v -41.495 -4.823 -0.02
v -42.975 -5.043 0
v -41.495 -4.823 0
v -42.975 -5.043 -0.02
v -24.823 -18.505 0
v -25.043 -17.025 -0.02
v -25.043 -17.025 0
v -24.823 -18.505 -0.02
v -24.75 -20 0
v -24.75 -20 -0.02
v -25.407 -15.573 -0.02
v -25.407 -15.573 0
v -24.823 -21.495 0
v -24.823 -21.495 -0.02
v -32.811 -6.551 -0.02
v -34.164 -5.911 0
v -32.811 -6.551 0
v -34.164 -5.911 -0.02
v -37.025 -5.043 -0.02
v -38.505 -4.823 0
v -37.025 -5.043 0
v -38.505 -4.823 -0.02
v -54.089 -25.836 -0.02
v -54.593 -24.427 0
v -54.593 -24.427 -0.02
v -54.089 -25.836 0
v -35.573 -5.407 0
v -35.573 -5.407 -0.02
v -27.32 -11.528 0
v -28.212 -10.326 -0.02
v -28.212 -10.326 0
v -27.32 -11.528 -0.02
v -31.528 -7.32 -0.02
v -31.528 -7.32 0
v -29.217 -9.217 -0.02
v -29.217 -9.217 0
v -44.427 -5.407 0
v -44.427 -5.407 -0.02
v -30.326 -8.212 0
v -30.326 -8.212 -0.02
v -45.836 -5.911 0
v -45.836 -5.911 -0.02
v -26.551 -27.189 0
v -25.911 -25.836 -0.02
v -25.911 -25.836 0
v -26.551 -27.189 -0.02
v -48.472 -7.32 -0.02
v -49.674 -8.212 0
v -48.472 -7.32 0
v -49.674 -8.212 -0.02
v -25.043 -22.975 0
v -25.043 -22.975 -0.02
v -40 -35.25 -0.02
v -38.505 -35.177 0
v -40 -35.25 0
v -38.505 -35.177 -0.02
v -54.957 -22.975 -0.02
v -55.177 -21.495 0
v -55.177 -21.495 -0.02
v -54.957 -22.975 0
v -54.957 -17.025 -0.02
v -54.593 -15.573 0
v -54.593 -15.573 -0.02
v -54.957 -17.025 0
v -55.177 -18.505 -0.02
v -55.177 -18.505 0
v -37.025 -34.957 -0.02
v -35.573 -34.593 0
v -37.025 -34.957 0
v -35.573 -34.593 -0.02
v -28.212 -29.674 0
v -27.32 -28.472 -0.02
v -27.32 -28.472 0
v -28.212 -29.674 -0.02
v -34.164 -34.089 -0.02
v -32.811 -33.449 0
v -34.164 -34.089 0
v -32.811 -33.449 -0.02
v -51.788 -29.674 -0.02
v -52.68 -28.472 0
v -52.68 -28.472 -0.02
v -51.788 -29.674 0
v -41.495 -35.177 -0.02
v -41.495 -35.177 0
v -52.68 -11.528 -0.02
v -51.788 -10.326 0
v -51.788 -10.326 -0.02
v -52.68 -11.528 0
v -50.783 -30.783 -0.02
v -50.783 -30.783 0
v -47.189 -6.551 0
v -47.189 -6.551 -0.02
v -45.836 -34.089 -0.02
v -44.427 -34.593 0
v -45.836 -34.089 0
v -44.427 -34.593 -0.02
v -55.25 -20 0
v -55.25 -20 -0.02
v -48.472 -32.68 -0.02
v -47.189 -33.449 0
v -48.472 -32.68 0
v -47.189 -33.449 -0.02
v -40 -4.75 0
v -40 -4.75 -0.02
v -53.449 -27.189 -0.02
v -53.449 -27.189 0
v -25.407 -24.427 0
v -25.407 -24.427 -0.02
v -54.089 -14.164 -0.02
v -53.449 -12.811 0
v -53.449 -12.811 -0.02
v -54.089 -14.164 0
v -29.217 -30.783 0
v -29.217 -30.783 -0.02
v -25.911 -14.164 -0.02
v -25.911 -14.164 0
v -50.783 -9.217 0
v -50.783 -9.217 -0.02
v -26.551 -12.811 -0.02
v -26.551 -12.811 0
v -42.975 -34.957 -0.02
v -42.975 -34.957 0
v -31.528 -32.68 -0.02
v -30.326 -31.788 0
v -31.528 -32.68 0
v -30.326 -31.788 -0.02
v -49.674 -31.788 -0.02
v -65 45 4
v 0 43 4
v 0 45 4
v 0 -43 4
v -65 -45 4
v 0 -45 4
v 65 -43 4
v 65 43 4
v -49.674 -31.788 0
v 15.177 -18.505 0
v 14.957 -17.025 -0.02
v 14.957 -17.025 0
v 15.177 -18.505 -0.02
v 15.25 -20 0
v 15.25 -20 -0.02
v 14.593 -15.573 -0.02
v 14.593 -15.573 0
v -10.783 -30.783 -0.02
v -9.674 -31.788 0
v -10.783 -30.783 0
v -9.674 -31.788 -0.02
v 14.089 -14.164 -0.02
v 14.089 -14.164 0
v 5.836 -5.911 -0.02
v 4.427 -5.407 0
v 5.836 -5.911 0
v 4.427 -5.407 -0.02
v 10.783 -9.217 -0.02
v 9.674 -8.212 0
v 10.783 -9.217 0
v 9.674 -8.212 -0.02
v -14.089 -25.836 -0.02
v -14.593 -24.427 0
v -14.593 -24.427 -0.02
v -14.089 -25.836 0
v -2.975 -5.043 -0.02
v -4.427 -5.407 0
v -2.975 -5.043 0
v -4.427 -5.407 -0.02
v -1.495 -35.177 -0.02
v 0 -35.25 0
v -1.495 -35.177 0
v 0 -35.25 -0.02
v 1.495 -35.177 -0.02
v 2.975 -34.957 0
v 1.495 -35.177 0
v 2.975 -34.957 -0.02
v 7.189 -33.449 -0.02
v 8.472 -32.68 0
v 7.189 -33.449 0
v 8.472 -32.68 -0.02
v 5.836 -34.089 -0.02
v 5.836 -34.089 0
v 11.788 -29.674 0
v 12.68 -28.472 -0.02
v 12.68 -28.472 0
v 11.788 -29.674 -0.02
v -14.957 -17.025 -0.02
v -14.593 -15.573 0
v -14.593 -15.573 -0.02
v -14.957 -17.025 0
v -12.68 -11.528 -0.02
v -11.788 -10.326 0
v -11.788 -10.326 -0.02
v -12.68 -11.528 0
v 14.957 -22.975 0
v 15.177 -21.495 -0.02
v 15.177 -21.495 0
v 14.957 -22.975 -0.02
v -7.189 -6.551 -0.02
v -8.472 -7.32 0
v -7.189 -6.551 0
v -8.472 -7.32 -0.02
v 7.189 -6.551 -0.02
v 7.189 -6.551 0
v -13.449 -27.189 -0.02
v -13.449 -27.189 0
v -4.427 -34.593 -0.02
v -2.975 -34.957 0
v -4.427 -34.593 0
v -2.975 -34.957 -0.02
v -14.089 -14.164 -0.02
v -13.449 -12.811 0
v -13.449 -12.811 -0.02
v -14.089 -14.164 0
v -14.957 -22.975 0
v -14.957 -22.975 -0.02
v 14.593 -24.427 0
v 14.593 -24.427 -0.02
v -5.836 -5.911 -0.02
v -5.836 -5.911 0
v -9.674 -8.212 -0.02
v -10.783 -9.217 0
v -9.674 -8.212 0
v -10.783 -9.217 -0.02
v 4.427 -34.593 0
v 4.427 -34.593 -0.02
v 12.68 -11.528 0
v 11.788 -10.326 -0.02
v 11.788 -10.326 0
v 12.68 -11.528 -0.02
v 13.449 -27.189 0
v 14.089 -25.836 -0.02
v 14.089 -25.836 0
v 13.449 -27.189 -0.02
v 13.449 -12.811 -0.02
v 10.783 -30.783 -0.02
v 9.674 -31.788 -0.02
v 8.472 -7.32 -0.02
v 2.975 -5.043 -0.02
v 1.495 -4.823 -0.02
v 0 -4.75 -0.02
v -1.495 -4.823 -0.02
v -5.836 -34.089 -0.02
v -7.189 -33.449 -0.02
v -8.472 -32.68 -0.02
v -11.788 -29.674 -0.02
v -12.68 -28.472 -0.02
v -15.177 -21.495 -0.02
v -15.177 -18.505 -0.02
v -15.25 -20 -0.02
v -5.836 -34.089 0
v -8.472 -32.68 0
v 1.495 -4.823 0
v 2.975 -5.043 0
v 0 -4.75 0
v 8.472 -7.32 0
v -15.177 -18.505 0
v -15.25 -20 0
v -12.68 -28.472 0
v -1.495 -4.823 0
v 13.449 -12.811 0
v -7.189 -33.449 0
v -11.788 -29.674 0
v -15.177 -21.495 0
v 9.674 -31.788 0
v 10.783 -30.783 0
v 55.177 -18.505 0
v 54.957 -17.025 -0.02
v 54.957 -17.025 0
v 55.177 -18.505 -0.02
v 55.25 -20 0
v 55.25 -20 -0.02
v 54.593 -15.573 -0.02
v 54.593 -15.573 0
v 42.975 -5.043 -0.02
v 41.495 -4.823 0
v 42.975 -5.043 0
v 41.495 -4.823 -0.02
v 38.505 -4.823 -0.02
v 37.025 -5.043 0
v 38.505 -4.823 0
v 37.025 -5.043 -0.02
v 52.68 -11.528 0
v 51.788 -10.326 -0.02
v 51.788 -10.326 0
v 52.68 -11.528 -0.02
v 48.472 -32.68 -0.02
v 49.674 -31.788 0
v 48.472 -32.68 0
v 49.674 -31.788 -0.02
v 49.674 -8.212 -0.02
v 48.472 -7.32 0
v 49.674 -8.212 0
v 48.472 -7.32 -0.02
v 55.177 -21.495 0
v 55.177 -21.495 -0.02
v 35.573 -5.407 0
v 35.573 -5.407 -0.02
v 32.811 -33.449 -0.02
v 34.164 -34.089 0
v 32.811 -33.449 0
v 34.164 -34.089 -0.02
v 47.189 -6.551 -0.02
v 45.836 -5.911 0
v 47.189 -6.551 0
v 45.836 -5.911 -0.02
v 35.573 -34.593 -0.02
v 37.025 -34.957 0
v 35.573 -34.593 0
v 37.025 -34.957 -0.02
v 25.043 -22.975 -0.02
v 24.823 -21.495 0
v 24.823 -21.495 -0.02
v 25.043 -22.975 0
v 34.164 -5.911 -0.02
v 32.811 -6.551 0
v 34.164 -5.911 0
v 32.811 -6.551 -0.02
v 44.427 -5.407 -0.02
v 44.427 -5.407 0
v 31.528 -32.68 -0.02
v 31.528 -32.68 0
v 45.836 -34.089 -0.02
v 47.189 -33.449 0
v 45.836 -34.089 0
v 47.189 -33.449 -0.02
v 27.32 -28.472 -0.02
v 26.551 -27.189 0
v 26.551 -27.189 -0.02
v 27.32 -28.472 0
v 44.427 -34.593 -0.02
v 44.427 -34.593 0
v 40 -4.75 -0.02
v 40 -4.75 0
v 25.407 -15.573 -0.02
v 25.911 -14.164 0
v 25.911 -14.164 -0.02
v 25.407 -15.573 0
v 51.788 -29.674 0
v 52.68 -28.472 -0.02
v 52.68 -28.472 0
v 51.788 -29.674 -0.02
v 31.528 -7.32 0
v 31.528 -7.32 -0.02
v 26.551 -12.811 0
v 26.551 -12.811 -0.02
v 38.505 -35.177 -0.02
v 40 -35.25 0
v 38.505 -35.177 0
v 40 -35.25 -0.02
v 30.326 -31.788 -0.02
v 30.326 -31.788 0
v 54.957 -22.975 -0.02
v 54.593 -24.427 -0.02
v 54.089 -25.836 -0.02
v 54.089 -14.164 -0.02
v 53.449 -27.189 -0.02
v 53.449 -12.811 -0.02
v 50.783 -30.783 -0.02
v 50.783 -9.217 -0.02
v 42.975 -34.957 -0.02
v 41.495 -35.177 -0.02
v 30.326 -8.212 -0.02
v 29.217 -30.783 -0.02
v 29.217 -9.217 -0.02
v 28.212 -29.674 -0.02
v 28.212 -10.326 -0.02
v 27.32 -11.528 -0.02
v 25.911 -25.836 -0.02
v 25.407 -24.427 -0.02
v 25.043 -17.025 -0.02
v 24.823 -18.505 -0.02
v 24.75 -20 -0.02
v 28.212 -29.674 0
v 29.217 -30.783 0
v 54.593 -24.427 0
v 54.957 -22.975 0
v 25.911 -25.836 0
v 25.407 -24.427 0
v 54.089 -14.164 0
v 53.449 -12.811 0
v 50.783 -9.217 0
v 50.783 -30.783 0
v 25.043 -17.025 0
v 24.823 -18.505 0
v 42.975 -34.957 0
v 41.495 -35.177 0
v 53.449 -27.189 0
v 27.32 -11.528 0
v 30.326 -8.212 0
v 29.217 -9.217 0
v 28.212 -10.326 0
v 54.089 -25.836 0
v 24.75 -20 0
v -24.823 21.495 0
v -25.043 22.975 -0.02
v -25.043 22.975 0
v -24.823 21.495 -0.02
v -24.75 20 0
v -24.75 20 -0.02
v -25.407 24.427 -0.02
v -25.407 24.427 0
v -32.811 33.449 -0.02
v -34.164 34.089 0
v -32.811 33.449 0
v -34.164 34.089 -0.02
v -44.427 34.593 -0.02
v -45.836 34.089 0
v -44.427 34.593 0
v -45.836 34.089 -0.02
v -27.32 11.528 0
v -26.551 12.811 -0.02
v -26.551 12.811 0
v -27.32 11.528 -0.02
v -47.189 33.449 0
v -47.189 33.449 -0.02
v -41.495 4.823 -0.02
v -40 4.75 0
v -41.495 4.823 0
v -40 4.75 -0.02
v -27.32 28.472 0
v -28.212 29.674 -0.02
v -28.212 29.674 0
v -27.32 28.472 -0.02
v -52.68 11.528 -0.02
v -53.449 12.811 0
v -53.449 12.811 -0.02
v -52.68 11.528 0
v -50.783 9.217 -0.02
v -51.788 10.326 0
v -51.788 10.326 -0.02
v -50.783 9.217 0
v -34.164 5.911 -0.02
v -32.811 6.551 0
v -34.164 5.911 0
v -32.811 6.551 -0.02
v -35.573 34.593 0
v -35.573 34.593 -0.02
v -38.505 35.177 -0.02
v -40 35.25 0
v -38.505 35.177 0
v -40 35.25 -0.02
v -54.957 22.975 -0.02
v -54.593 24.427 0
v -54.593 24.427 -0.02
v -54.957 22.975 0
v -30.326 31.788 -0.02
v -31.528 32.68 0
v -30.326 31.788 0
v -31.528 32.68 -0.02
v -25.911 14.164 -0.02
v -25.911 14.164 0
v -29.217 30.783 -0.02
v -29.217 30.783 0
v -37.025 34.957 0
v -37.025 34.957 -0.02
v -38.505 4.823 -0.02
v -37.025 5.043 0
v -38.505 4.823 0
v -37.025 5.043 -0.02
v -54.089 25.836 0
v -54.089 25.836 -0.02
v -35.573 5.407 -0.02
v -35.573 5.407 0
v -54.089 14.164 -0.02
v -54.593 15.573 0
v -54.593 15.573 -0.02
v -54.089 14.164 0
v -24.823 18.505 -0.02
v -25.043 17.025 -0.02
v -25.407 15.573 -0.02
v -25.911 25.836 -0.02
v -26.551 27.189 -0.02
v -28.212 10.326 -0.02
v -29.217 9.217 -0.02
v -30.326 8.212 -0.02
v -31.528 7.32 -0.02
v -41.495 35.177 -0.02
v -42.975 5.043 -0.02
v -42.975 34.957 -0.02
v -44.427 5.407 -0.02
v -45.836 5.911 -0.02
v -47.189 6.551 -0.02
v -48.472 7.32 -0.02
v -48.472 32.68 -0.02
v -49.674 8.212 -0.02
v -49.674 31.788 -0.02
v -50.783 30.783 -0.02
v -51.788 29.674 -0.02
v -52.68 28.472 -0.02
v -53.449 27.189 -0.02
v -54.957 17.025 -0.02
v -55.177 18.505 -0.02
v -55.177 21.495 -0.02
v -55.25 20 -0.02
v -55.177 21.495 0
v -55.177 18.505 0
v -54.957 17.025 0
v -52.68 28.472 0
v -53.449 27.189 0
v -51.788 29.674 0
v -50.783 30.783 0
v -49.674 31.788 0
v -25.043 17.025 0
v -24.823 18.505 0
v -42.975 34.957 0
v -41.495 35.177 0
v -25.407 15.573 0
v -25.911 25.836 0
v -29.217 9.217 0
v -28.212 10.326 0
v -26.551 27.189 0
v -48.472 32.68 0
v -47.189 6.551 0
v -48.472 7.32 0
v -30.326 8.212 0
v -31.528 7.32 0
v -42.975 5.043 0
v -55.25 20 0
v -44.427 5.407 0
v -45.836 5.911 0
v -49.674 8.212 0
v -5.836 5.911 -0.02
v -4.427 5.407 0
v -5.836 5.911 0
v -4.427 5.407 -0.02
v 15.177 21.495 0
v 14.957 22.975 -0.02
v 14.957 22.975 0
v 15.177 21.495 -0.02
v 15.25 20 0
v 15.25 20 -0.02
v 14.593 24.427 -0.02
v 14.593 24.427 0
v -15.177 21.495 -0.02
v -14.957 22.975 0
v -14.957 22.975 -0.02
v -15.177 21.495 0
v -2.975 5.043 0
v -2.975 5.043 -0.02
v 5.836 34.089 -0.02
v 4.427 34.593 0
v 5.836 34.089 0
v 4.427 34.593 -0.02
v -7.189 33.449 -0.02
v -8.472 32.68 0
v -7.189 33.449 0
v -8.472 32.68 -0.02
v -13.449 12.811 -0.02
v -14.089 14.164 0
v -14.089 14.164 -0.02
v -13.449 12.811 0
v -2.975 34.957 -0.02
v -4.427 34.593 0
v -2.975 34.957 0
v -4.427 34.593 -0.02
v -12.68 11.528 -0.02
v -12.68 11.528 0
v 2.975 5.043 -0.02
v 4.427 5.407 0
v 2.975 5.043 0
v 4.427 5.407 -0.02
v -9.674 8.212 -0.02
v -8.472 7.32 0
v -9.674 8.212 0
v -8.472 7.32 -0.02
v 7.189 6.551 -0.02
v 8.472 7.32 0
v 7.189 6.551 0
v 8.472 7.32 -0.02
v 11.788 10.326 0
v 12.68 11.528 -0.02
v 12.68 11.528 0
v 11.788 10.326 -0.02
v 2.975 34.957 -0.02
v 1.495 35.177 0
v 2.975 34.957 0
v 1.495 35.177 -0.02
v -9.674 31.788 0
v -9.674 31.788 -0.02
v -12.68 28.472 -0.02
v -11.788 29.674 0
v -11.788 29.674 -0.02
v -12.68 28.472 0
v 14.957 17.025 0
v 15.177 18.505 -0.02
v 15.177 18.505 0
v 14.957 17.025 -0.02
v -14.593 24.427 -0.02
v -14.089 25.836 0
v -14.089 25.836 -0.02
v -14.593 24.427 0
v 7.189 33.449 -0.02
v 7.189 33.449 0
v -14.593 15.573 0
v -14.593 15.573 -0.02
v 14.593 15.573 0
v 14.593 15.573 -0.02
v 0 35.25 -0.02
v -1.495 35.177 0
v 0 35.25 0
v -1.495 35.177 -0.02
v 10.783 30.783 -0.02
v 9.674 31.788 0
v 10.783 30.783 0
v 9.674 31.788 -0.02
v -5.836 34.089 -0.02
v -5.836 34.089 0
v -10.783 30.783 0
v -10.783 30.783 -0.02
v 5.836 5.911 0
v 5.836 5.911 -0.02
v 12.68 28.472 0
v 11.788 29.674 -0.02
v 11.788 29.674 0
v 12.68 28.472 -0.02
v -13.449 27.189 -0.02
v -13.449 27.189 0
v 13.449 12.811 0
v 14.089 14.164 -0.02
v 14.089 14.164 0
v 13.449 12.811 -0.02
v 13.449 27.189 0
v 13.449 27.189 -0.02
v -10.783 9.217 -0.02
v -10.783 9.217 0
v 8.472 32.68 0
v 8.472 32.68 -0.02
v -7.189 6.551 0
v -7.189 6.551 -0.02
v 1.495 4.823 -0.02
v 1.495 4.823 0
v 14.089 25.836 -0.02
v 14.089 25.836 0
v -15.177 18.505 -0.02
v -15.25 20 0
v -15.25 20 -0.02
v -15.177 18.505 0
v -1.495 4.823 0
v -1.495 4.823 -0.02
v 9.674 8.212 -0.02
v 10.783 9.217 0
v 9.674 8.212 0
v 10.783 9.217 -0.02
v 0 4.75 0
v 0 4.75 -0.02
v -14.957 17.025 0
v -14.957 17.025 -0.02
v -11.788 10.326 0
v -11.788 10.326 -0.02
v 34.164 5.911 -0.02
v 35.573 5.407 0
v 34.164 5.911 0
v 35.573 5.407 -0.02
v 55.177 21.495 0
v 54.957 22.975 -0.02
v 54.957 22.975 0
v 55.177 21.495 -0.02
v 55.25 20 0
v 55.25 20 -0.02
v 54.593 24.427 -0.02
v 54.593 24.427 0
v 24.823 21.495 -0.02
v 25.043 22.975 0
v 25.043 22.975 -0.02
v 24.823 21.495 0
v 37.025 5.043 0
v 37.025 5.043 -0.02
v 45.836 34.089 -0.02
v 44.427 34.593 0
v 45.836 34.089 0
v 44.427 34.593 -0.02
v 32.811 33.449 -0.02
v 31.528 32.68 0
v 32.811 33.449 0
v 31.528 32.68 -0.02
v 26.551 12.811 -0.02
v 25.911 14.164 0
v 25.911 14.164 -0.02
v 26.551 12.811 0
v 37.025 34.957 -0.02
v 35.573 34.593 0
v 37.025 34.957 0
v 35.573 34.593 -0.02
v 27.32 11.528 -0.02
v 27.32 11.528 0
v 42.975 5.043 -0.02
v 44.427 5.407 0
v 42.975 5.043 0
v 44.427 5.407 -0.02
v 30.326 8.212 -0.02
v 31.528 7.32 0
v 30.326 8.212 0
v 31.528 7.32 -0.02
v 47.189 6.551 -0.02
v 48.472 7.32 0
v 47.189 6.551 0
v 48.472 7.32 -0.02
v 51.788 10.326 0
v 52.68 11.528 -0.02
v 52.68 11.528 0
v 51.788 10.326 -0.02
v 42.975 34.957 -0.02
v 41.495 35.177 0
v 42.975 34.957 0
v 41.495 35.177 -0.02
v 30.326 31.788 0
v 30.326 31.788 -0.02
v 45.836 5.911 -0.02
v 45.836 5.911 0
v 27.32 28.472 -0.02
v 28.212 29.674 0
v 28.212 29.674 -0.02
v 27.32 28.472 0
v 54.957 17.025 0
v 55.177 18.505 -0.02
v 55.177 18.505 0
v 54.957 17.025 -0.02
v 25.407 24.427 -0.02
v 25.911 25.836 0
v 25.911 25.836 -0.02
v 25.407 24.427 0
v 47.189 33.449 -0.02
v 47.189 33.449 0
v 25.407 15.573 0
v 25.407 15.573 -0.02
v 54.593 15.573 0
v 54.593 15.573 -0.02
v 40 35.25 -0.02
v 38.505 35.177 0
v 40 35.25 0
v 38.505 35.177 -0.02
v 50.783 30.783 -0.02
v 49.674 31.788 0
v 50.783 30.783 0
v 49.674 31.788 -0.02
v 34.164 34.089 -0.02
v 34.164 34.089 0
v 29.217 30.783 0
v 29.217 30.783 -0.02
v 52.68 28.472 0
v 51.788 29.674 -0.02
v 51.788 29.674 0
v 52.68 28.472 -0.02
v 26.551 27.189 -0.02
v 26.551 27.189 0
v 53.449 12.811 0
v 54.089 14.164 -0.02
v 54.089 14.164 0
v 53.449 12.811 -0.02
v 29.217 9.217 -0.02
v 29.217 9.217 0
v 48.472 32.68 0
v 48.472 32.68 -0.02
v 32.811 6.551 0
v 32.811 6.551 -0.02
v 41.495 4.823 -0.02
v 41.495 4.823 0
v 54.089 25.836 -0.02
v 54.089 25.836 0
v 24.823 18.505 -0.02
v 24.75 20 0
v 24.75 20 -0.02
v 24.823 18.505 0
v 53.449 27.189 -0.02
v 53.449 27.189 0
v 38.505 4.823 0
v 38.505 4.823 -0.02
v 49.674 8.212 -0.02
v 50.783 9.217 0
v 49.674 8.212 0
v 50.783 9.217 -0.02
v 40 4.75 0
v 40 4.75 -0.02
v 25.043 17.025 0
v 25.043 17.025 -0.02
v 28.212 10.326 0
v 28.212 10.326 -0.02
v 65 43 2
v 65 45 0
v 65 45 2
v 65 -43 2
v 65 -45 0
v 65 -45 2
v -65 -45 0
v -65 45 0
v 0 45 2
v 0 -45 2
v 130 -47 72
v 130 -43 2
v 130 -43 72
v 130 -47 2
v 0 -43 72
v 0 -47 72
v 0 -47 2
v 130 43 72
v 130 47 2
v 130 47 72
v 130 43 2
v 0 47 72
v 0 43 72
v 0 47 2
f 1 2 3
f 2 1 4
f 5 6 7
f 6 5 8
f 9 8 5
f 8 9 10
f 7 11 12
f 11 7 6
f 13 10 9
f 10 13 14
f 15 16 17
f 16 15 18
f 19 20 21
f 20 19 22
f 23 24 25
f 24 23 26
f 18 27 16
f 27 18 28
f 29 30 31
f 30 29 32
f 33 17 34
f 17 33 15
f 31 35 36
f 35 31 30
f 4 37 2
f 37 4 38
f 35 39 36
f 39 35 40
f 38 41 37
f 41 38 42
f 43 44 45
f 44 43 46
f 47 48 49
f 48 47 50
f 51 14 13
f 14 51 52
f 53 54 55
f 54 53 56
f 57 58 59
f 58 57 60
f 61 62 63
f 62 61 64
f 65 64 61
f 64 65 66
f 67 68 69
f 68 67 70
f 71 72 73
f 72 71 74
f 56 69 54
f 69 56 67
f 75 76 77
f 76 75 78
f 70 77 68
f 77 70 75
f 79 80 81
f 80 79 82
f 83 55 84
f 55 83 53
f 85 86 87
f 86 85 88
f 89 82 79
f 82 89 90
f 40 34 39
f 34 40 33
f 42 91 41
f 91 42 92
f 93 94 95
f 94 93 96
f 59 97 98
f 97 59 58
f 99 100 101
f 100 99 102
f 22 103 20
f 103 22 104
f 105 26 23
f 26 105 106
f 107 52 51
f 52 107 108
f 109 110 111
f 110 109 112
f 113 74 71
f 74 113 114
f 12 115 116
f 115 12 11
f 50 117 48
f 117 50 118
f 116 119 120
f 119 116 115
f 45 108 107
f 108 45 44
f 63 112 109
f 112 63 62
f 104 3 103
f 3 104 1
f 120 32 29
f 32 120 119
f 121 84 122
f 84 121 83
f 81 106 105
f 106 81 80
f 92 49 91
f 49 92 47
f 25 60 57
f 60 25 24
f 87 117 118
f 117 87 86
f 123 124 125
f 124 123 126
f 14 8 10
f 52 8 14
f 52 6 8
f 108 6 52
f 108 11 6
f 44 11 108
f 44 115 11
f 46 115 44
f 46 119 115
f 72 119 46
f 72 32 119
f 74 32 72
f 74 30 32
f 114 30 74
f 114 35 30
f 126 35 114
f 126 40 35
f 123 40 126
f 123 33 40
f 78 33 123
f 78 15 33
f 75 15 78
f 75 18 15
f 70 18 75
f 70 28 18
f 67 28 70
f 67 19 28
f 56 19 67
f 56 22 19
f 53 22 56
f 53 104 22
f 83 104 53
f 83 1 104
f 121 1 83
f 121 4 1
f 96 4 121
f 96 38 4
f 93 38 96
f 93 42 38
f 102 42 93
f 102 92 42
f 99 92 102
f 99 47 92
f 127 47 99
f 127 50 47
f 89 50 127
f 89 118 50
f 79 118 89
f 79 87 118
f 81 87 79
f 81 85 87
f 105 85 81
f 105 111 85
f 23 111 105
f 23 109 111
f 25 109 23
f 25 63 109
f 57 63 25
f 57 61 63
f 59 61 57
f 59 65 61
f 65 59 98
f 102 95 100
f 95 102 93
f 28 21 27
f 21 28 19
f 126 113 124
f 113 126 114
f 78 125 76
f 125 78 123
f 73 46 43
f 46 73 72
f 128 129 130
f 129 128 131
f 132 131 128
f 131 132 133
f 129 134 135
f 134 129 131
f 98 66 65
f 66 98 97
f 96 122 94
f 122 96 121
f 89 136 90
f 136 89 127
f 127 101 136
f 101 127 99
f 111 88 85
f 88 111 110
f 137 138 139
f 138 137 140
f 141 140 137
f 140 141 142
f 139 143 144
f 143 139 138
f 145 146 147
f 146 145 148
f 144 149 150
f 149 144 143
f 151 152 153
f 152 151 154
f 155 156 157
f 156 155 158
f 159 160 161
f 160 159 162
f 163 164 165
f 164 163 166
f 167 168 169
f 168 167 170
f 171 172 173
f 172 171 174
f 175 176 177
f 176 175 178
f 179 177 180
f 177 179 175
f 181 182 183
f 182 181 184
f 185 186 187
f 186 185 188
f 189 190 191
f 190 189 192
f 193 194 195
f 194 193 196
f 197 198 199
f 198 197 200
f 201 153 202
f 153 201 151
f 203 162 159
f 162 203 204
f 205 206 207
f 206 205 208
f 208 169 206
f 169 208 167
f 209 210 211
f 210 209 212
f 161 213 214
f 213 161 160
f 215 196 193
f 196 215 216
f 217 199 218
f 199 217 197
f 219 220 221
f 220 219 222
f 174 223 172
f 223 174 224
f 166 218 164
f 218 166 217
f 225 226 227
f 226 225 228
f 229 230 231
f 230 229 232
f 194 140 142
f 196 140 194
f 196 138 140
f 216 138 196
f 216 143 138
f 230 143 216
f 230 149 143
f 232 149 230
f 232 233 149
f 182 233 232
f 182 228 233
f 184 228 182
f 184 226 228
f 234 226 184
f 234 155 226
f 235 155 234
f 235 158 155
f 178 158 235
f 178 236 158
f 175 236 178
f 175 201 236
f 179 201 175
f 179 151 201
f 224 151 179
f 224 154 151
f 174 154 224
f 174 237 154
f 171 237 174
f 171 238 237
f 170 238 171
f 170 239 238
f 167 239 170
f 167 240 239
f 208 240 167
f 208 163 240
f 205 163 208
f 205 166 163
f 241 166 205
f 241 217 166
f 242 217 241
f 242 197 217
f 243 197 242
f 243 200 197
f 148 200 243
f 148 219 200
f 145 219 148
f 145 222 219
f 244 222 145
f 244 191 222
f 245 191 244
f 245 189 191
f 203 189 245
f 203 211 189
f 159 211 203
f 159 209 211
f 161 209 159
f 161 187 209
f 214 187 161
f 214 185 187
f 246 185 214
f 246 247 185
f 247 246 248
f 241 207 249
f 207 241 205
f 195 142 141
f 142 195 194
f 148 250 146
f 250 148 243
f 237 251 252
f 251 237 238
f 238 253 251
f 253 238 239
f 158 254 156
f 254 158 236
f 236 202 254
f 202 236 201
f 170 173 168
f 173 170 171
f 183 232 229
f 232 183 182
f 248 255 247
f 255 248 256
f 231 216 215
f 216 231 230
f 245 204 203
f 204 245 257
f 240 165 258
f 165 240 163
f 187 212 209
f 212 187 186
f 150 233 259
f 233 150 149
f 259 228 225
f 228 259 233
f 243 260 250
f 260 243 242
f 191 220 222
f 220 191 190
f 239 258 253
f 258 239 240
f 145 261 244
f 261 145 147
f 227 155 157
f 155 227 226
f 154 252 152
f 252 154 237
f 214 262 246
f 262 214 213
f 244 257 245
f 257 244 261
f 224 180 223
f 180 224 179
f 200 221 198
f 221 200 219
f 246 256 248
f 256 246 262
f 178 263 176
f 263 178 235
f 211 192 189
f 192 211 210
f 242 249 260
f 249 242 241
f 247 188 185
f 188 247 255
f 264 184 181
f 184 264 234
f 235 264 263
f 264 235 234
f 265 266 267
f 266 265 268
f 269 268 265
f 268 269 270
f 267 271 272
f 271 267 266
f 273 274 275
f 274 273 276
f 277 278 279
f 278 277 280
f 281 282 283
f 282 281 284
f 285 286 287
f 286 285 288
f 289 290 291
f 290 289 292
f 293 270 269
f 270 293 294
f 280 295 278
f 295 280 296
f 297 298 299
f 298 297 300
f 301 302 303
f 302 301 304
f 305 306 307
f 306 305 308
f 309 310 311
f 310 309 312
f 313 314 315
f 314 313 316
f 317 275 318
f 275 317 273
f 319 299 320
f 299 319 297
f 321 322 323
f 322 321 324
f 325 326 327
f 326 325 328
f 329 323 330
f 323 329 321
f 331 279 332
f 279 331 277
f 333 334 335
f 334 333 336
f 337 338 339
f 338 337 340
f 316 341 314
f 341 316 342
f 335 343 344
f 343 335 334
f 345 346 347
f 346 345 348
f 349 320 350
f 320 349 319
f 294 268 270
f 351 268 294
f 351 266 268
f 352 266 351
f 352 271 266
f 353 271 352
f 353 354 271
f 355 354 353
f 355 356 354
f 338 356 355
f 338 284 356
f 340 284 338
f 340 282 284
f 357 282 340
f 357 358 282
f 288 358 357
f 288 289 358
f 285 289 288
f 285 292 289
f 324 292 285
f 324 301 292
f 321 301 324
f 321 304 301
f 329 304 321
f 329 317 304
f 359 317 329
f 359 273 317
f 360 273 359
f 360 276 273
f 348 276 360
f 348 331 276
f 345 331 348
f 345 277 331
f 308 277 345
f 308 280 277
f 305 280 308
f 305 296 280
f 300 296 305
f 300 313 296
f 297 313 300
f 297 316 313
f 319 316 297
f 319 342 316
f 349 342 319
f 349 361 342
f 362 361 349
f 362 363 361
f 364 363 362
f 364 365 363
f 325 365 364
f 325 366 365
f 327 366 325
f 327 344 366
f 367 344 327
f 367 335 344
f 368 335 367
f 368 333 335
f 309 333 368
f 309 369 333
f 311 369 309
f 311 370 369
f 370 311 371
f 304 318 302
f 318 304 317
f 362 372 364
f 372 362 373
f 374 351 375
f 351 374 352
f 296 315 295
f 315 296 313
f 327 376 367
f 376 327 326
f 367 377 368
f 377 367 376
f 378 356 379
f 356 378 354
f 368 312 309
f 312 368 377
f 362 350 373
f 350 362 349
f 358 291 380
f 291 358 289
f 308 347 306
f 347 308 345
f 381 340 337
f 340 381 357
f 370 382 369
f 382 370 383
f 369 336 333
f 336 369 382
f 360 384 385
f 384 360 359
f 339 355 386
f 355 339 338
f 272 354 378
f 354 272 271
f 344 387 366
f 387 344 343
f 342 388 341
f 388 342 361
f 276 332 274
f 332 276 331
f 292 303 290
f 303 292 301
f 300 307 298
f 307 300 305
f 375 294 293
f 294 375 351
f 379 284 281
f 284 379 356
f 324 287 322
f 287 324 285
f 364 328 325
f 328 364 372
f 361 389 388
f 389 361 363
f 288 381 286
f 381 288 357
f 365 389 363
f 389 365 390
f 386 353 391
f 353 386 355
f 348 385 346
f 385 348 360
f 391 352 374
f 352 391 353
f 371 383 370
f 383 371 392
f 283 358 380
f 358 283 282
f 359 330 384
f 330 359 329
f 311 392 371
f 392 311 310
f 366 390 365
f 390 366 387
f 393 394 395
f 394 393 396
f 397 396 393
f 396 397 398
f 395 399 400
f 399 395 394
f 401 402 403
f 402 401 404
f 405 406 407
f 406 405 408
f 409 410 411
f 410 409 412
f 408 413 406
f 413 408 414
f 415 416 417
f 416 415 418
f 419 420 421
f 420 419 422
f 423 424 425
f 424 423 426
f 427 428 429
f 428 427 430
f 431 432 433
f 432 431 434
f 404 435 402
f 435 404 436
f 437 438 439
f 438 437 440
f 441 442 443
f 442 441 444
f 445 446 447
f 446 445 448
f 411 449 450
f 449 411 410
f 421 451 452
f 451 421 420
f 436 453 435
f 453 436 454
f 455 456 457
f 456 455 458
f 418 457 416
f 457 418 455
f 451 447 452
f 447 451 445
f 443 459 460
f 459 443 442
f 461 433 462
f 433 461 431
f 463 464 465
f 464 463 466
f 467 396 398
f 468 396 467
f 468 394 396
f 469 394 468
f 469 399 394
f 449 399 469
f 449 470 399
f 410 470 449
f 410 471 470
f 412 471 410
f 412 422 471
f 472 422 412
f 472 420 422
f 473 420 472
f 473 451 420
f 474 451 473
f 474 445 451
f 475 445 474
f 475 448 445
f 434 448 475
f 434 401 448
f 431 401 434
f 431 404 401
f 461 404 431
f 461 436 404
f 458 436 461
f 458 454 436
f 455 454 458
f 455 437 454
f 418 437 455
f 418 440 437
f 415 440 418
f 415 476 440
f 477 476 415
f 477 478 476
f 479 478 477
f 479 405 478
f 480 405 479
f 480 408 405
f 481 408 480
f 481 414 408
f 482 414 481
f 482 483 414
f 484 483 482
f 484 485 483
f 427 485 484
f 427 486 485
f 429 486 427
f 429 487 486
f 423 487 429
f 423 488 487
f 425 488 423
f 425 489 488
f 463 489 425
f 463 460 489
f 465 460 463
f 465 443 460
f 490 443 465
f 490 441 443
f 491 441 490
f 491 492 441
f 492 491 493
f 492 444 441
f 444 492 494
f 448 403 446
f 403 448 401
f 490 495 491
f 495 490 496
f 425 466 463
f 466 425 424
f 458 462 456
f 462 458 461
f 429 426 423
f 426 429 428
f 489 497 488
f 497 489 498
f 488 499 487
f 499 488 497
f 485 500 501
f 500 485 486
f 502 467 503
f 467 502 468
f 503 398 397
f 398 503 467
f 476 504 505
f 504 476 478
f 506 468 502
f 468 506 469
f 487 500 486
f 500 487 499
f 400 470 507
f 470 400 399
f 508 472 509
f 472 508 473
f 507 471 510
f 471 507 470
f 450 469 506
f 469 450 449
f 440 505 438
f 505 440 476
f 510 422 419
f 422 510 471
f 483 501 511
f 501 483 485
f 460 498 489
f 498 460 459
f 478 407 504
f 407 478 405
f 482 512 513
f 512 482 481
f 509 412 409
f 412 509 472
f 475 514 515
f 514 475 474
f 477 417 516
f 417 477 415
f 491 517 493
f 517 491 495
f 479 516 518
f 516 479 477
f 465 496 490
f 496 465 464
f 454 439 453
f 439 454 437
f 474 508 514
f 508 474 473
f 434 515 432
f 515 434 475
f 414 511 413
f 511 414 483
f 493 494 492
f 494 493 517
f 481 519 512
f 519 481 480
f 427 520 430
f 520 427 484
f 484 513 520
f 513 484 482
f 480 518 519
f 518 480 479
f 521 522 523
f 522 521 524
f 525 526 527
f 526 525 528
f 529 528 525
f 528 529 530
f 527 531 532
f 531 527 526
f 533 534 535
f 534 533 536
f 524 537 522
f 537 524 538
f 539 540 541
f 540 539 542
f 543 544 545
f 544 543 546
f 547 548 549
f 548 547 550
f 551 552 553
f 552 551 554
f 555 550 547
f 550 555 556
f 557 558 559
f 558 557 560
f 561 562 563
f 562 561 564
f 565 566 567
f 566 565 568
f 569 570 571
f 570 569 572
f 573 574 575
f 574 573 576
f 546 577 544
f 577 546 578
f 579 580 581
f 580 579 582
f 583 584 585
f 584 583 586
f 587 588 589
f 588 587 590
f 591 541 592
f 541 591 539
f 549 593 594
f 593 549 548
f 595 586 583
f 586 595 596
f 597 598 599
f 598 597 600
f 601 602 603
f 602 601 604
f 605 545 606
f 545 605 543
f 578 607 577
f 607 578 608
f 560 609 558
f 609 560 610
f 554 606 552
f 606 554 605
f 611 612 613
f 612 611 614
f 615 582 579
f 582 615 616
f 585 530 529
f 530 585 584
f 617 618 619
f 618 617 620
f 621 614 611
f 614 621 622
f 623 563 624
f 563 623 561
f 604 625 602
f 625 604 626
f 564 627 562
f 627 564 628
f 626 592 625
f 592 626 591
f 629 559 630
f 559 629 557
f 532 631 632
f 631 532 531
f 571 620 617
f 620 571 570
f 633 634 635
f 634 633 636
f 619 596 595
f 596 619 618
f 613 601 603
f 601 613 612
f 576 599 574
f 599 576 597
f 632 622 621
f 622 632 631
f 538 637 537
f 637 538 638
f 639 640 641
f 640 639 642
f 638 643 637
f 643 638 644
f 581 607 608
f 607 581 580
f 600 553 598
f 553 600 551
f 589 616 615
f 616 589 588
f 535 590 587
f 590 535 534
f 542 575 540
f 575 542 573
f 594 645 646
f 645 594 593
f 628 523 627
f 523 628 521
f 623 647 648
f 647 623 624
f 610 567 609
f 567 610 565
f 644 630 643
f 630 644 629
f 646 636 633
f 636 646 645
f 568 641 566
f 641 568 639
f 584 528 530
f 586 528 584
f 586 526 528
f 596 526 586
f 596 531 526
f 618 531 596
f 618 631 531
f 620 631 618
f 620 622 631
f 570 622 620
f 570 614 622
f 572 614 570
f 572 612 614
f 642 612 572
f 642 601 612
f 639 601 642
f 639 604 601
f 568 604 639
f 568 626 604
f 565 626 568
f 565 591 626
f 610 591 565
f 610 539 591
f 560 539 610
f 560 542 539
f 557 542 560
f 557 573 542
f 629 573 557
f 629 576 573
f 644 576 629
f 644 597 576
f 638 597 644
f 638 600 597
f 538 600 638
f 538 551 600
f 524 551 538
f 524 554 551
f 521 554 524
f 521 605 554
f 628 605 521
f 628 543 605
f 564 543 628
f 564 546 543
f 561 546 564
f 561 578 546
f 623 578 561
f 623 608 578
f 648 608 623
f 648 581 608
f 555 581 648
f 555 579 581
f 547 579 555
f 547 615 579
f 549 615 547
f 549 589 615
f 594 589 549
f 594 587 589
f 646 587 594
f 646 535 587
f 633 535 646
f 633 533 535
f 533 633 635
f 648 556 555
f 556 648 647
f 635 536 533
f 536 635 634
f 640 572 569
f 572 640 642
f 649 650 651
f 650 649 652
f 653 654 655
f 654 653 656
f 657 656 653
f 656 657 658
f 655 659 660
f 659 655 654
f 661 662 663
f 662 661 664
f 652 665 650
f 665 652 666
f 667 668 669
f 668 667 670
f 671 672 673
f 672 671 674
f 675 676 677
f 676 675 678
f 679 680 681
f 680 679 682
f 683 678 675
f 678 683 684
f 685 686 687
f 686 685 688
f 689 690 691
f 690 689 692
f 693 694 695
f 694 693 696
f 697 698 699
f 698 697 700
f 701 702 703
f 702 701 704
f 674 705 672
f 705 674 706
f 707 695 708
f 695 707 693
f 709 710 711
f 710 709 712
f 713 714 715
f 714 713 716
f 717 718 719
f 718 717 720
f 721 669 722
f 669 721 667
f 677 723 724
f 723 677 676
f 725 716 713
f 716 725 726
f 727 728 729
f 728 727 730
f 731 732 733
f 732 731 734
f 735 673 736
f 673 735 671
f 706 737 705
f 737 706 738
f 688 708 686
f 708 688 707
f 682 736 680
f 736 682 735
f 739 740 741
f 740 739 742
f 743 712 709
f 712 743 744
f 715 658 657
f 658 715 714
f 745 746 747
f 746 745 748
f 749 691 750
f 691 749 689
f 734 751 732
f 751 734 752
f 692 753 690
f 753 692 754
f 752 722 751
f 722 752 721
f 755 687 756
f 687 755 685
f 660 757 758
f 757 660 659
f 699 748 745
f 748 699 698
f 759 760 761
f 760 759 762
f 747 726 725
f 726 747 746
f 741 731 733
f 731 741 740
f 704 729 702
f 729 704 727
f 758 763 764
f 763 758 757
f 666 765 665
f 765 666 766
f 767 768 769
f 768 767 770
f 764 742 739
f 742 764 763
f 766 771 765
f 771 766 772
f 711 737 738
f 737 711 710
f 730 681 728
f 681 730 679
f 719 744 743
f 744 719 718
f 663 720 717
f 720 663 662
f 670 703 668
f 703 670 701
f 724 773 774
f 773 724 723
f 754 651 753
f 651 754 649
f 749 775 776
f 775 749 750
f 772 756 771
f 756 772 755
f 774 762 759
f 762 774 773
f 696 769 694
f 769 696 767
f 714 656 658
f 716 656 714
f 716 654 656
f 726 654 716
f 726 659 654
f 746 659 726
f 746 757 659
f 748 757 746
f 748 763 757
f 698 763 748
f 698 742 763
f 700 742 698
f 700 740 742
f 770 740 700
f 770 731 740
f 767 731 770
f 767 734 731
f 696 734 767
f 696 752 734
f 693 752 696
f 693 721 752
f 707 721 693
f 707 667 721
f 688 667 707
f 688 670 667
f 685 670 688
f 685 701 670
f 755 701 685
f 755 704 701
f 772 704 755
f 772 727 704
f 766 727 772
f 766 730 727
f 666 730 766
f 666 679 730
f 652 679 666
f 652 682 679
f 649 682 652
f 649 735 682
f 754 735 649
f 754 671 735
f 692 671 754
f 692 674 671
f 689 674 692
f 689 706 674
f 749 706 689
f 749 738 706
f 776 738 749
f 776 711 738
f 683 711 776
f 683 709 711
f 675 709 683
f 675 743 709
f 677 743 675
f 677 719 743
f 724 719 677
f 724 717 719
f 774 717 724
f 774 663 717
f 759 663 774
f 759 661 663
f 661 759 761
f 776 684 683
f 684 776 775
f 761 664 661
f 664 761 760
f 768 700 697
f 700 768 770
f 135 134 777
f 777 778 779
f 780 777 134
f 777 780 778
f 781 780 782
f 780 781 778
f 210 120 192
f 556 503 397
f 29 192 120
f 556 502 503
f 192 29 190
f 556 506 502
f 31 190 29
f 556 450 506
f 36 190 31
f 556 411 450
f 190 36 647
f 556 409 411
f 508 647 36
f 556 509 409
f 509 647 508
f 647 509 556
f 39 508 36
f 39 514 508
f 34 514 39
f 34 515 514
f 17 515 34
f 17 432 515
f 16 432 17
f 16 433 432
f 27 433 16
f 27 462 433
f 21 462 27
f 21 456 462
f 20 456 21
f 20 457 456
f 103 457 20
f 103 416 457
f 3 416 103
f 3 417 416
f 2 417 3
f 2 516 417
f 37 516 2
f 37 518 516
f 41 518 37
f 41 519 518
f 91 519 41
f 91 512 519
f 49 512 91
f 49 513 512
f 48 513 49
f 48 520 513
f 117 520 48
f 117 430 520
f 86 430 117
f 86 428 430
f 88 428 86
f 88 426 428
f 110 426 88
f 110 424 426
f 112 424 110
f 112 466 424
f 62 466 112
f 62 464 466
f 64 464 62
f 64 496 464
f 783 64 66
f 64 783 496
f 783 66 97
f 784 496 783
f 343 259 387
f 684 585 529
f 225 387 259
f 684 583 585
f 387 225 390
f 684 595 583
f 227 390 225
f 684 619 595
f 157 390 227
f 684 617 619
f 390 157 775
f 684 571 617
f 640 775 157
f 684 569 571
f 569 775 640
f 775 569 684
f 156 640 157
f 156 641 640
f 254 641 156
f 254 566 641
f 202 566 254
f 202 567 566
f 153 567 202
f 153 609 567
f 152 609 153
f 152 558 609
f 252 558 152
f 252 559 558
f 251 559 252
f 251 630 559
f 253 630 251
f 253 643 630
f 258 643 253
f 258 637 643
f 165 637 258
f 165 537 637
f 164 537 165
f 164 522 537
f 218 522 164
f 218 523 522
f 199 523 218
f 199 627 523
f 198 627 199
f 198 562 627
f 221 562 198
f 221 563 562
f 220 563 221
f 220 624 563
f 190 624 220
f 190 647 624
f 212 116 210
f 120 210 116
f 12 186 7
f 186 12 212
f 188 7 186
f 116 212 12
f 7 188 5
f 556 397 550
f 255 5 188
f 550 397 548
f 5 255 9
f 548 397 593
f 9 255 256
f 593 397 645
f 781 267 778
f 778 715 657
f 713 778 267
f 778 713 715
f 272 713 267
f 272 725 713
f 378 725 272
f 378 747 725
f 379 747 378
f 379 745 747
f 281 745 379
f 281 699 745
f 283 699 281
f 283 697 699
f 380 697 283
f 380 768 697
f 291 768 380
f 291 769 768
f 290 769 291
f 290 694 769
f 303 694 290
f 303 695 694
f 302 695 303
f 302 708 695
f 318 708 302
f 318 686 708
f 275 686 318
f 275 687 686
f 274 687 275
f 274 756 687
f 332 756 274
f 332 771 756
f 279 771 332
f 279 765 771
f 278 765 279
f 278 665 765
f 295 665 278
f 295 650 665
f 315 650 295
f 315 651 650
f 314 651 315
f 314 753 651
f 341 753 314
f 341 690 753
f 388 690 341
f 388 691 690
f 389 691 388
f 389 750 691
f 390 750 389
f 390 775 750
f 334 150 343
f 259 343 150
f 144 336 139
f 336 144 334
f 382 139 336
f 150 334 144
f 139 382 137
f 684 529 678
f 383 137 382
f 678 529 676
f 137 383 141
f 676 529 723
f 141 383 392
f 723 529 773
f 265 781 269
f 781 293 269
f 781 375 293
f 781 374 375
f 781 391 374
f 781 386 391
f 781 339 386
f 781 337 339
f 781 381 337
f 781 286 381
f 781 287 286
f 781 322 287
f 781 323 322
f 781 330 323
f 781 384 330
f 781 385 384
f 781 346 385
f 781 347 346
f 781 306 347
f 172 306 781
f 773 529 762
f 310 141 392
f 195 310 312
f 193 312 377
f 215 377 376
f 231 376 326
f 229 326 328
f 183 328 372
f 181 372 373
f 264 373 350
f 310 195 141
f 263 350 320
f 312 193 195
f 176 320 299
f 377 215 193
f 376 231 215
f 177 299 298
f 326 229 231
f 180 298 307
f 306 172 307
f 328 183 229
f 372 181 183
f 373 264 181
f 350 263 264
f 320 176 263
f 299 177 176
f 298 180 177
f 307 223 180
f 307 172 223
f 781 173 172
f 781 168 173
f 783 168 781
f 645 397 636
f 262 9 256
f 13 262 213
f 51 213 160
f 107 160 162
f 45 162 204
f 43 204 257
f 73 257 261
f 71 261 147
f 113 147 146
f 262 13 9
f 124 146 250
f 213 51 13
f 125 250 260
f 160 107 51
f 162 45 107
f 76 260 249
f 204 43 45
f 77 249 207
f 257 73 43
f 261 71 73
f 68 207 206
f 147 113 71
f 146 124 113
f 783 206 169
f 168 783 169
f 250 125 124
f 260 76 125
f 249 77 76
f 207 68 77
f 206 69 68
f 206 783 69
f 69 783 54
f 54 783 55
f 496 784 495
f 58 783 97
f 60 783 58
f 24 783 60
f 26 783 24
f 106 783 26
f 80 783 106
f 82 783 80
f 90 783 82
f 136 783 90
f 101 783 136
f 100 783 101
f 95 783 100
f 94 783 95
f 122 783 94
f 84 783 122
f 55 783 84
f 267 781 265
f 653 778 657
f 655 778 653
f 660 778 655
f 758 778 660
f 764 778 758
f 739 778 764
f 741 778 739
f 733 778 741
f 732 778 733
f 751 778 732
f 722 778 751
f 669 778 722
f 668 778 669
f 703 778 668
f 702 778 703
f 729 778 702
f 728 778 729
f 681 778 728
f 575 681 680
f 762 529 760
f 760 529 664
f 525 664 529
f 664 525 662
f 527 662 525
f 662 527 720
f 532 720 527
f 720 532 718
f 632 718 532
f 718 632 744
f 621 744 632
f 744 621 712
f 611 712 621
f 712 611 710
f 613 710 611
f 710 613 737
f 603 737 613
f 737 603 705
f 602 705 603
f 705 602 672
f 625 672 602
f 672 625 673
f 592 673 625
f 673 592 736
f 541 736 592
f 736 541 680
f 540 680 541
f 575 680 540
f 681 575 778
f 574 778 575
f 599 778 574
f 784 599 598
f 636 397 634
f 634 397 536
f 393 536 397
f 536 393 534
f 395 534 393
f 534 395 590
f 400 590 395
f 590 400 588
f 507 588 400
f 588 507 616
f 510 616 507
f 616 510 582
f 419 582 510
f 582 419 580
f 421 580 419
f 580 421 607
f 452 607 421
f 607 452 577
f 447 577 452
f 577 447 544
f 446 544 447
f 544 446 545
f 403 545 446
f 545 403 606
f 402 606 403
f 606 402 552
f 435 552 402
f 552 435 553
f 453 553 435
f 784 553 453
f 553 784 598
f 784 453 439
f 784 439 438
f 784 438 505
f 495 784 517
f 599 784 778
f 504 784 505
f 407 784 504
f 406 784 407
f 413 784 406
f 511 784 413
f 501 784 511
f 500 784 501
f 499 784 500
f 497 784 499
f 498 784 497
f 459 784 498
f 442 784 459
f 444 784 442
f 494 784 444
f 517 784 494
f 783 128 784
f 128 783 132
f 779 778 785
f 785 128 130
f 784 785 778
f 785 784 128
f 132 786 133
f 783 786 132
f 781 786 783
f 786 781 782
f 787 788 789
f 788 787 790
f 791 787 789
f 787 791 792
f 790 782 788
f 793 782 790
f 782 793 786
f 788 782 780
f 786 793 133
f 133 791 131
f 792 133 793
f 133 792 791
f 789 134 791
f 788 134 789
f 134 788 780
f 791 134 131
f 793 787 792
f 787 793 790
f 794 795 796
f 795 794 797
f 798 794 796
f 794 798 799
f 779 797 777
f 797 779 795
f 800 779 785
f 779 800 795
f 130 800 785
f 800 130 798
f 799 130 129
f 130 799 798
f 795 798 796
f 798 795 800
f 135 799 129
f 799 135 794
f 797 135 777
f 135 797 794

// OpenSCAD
// Dimensions for the rack for six 50 mL conical (Falcon-type) tubes
// Print orientation: flat plate on bed (z = 0 to 4), walls rise from edges
// After flipping, rack stands on walls, tubes through holes

// Plate dimensions
plate_length_X = 130;   // mm
plate_width_Y = 90;       // mm
plate_thickness_Z = 4;   // mm

// Hole parameters
hole_diameter = 30.5;     // mm
hole_spacing_X = 40;     // mm (center-to-center along X)
hole_spacing_Y = 40;     // mm (center-to-center along Y)
num_holes_X = 3;         // 3 holes along X (2 rows of 3)
num_holes_Y = 2;         // 2 rows along Y

// Wall parameters
wall_length_X = plate_length_X;     // 130 mm
wall_thickness_Y = 4;                 // mm (along Y)
wall_height_Z = 70;             // mm (from plate to top)

// Set resolution for smooth curves
$fn = 64;

// Main module
module rack() {
    // 1. Plate: flat rectangular base, centered at origin (X, Y) = (0, 0)
    // Plate extends from -65 to +65 in X, -45 to +45 in Y, z = 0 to 4
    translate([0, 0, 0])
        cube([plate_length_X, plate_width_Y, plate_thickness_Z], center = true);

    // 2. Holes: 2 rows of 3 holes, centered on plate
    // Center of grid: (0, 0) for the whole array
    // Hole positions: offset from center by half-grid span
    for (i = [0 : num_holes_Y - 1]) {
        for (j = [0 : num_holes_X - 1]) {
            // Calculate hole center in X and Y
            hole_x = (j - (num_holes_X - 1)/2) * hole_spacing_X;
            hole_y = (i - (num_holes_Y - 1)/2) * hole_spacing_Y;

            // Cut hole through the plate (extend slightly beyond to ensure clean cut)
            translate([hole_x, hole_y, -0.01])
                cylinder(h = plate_thickness_Z + 0.02, d = hole_diameter, center = true);
        }
    }

    // 3. Wall along Y = -plate_width_Y/2 (bottom long edge)
    // Wall is 4 mm thick in Y, 130 mm long in X, from z = 0 to 70
    // Positioned at Y = -plate_width_Y/2 - wall_thickness_Y/2 (so wall is flush with edge)
    wall_offset_Y_bottom = -plate_width_Y/2 - wall_thickness_Y/2;
    translate([0, wall_offset_Y_bottom, 0])
        cube([wall_length_X, wall_thickness_Y, wall_height_Z], center = false);

    // 4. Wall along Y = +plate_width_Y/2 (top long edge)
    wall_offset_Y_top = +plate_width_Y/2 - wall_thickness_Y/2;
    translate([0, wall_offset_Y_top, 0])
        cube([wall_length_X, wall_thickness_Y, wall_height_Z], center = false);
}

// Render the entire rack
// Ensure the entire part is at or above z = 0 to avoid bed contact below z = 0
// The current model has the plate from z = 0 to 4, so the bottom of the plate is at z = 0
// But the walls extend from z = 0 to 70, so the lowest point is at z = 0
// However, the measurement report shows z = -2.02, which suggests the origin is not aligned

// The issue: the cube for the plate is centered at (0,0,0), so it extends from z = -2 to z = +2
// But the specification says: "a flat plate 130 mm (X) by 90 mm (Y) and 4 mm thick lies on the bed (z = 0 to 4)"

// Fix: shift the entire model so that the plate's bottom is at z = 0
// That means the plate should go from z = 0 to z = 4, not centered at z = 0

// Recompute: move the entire model up by 2 mm in Z
// Apply this translation to all components

// Revised module with correct Z alignment
module rack() {
    // 1. Plate: flat rectangular base, from z = 0 to 4 (not centered at z = 0)
    // So center of plate in Z is at z = 2
    translate([0, 0, 2])
        cube([plate_length_X, plate_width_Y, plate_thickness_Z], center = true);

    // 2. Holes: same X,Y positions, but now at Z = 2 (centered in Z)
    for (i = [0 : num_holes_Y - 1]) {
        for (j = [0 : num_holes_X - 1]) {
            hole_x = (j - (num_holes_X - 1)/2) * hole_spacing_X;
            hole_y = (i - (num_holes_Y - 1)/2) * hole_spacing_Y;

            // Cut hole through the plate (extend slightly beyond to ensure clean cut)
            translate([hole_x, hole_y, 2 - 0.01])
                cylinder(h = plate_thickness_Z + 0.02, d = hole_diameter, center = true);
        }
    }

    // 3. Wall along Y = -plate_width_Y/2 (bottom long edge)
    wall_offset_Y_bottom = -plate_width_Y/2 - wall_thickness_Y/2;
    translate([0, wall_offset_Y_bottom, 2])  // shift wall base to z = 0
        cube([wall_length_X, wall_thickness_Y, wall_height_Z], center = false);

    // 4. Wall along Y = +plate_width_Y/2 (top long edge)
    wall_offset_Y_top = +plate_width_Y/2 - wall_thickness_Y/2;
    translate([0, wall_offset_Y_top, 2])
        cube([wall_length_X, wall_thickness_Y, wall_height_Z], center = false);
}

// Render the entire rack with correct Z alignment
rack();
